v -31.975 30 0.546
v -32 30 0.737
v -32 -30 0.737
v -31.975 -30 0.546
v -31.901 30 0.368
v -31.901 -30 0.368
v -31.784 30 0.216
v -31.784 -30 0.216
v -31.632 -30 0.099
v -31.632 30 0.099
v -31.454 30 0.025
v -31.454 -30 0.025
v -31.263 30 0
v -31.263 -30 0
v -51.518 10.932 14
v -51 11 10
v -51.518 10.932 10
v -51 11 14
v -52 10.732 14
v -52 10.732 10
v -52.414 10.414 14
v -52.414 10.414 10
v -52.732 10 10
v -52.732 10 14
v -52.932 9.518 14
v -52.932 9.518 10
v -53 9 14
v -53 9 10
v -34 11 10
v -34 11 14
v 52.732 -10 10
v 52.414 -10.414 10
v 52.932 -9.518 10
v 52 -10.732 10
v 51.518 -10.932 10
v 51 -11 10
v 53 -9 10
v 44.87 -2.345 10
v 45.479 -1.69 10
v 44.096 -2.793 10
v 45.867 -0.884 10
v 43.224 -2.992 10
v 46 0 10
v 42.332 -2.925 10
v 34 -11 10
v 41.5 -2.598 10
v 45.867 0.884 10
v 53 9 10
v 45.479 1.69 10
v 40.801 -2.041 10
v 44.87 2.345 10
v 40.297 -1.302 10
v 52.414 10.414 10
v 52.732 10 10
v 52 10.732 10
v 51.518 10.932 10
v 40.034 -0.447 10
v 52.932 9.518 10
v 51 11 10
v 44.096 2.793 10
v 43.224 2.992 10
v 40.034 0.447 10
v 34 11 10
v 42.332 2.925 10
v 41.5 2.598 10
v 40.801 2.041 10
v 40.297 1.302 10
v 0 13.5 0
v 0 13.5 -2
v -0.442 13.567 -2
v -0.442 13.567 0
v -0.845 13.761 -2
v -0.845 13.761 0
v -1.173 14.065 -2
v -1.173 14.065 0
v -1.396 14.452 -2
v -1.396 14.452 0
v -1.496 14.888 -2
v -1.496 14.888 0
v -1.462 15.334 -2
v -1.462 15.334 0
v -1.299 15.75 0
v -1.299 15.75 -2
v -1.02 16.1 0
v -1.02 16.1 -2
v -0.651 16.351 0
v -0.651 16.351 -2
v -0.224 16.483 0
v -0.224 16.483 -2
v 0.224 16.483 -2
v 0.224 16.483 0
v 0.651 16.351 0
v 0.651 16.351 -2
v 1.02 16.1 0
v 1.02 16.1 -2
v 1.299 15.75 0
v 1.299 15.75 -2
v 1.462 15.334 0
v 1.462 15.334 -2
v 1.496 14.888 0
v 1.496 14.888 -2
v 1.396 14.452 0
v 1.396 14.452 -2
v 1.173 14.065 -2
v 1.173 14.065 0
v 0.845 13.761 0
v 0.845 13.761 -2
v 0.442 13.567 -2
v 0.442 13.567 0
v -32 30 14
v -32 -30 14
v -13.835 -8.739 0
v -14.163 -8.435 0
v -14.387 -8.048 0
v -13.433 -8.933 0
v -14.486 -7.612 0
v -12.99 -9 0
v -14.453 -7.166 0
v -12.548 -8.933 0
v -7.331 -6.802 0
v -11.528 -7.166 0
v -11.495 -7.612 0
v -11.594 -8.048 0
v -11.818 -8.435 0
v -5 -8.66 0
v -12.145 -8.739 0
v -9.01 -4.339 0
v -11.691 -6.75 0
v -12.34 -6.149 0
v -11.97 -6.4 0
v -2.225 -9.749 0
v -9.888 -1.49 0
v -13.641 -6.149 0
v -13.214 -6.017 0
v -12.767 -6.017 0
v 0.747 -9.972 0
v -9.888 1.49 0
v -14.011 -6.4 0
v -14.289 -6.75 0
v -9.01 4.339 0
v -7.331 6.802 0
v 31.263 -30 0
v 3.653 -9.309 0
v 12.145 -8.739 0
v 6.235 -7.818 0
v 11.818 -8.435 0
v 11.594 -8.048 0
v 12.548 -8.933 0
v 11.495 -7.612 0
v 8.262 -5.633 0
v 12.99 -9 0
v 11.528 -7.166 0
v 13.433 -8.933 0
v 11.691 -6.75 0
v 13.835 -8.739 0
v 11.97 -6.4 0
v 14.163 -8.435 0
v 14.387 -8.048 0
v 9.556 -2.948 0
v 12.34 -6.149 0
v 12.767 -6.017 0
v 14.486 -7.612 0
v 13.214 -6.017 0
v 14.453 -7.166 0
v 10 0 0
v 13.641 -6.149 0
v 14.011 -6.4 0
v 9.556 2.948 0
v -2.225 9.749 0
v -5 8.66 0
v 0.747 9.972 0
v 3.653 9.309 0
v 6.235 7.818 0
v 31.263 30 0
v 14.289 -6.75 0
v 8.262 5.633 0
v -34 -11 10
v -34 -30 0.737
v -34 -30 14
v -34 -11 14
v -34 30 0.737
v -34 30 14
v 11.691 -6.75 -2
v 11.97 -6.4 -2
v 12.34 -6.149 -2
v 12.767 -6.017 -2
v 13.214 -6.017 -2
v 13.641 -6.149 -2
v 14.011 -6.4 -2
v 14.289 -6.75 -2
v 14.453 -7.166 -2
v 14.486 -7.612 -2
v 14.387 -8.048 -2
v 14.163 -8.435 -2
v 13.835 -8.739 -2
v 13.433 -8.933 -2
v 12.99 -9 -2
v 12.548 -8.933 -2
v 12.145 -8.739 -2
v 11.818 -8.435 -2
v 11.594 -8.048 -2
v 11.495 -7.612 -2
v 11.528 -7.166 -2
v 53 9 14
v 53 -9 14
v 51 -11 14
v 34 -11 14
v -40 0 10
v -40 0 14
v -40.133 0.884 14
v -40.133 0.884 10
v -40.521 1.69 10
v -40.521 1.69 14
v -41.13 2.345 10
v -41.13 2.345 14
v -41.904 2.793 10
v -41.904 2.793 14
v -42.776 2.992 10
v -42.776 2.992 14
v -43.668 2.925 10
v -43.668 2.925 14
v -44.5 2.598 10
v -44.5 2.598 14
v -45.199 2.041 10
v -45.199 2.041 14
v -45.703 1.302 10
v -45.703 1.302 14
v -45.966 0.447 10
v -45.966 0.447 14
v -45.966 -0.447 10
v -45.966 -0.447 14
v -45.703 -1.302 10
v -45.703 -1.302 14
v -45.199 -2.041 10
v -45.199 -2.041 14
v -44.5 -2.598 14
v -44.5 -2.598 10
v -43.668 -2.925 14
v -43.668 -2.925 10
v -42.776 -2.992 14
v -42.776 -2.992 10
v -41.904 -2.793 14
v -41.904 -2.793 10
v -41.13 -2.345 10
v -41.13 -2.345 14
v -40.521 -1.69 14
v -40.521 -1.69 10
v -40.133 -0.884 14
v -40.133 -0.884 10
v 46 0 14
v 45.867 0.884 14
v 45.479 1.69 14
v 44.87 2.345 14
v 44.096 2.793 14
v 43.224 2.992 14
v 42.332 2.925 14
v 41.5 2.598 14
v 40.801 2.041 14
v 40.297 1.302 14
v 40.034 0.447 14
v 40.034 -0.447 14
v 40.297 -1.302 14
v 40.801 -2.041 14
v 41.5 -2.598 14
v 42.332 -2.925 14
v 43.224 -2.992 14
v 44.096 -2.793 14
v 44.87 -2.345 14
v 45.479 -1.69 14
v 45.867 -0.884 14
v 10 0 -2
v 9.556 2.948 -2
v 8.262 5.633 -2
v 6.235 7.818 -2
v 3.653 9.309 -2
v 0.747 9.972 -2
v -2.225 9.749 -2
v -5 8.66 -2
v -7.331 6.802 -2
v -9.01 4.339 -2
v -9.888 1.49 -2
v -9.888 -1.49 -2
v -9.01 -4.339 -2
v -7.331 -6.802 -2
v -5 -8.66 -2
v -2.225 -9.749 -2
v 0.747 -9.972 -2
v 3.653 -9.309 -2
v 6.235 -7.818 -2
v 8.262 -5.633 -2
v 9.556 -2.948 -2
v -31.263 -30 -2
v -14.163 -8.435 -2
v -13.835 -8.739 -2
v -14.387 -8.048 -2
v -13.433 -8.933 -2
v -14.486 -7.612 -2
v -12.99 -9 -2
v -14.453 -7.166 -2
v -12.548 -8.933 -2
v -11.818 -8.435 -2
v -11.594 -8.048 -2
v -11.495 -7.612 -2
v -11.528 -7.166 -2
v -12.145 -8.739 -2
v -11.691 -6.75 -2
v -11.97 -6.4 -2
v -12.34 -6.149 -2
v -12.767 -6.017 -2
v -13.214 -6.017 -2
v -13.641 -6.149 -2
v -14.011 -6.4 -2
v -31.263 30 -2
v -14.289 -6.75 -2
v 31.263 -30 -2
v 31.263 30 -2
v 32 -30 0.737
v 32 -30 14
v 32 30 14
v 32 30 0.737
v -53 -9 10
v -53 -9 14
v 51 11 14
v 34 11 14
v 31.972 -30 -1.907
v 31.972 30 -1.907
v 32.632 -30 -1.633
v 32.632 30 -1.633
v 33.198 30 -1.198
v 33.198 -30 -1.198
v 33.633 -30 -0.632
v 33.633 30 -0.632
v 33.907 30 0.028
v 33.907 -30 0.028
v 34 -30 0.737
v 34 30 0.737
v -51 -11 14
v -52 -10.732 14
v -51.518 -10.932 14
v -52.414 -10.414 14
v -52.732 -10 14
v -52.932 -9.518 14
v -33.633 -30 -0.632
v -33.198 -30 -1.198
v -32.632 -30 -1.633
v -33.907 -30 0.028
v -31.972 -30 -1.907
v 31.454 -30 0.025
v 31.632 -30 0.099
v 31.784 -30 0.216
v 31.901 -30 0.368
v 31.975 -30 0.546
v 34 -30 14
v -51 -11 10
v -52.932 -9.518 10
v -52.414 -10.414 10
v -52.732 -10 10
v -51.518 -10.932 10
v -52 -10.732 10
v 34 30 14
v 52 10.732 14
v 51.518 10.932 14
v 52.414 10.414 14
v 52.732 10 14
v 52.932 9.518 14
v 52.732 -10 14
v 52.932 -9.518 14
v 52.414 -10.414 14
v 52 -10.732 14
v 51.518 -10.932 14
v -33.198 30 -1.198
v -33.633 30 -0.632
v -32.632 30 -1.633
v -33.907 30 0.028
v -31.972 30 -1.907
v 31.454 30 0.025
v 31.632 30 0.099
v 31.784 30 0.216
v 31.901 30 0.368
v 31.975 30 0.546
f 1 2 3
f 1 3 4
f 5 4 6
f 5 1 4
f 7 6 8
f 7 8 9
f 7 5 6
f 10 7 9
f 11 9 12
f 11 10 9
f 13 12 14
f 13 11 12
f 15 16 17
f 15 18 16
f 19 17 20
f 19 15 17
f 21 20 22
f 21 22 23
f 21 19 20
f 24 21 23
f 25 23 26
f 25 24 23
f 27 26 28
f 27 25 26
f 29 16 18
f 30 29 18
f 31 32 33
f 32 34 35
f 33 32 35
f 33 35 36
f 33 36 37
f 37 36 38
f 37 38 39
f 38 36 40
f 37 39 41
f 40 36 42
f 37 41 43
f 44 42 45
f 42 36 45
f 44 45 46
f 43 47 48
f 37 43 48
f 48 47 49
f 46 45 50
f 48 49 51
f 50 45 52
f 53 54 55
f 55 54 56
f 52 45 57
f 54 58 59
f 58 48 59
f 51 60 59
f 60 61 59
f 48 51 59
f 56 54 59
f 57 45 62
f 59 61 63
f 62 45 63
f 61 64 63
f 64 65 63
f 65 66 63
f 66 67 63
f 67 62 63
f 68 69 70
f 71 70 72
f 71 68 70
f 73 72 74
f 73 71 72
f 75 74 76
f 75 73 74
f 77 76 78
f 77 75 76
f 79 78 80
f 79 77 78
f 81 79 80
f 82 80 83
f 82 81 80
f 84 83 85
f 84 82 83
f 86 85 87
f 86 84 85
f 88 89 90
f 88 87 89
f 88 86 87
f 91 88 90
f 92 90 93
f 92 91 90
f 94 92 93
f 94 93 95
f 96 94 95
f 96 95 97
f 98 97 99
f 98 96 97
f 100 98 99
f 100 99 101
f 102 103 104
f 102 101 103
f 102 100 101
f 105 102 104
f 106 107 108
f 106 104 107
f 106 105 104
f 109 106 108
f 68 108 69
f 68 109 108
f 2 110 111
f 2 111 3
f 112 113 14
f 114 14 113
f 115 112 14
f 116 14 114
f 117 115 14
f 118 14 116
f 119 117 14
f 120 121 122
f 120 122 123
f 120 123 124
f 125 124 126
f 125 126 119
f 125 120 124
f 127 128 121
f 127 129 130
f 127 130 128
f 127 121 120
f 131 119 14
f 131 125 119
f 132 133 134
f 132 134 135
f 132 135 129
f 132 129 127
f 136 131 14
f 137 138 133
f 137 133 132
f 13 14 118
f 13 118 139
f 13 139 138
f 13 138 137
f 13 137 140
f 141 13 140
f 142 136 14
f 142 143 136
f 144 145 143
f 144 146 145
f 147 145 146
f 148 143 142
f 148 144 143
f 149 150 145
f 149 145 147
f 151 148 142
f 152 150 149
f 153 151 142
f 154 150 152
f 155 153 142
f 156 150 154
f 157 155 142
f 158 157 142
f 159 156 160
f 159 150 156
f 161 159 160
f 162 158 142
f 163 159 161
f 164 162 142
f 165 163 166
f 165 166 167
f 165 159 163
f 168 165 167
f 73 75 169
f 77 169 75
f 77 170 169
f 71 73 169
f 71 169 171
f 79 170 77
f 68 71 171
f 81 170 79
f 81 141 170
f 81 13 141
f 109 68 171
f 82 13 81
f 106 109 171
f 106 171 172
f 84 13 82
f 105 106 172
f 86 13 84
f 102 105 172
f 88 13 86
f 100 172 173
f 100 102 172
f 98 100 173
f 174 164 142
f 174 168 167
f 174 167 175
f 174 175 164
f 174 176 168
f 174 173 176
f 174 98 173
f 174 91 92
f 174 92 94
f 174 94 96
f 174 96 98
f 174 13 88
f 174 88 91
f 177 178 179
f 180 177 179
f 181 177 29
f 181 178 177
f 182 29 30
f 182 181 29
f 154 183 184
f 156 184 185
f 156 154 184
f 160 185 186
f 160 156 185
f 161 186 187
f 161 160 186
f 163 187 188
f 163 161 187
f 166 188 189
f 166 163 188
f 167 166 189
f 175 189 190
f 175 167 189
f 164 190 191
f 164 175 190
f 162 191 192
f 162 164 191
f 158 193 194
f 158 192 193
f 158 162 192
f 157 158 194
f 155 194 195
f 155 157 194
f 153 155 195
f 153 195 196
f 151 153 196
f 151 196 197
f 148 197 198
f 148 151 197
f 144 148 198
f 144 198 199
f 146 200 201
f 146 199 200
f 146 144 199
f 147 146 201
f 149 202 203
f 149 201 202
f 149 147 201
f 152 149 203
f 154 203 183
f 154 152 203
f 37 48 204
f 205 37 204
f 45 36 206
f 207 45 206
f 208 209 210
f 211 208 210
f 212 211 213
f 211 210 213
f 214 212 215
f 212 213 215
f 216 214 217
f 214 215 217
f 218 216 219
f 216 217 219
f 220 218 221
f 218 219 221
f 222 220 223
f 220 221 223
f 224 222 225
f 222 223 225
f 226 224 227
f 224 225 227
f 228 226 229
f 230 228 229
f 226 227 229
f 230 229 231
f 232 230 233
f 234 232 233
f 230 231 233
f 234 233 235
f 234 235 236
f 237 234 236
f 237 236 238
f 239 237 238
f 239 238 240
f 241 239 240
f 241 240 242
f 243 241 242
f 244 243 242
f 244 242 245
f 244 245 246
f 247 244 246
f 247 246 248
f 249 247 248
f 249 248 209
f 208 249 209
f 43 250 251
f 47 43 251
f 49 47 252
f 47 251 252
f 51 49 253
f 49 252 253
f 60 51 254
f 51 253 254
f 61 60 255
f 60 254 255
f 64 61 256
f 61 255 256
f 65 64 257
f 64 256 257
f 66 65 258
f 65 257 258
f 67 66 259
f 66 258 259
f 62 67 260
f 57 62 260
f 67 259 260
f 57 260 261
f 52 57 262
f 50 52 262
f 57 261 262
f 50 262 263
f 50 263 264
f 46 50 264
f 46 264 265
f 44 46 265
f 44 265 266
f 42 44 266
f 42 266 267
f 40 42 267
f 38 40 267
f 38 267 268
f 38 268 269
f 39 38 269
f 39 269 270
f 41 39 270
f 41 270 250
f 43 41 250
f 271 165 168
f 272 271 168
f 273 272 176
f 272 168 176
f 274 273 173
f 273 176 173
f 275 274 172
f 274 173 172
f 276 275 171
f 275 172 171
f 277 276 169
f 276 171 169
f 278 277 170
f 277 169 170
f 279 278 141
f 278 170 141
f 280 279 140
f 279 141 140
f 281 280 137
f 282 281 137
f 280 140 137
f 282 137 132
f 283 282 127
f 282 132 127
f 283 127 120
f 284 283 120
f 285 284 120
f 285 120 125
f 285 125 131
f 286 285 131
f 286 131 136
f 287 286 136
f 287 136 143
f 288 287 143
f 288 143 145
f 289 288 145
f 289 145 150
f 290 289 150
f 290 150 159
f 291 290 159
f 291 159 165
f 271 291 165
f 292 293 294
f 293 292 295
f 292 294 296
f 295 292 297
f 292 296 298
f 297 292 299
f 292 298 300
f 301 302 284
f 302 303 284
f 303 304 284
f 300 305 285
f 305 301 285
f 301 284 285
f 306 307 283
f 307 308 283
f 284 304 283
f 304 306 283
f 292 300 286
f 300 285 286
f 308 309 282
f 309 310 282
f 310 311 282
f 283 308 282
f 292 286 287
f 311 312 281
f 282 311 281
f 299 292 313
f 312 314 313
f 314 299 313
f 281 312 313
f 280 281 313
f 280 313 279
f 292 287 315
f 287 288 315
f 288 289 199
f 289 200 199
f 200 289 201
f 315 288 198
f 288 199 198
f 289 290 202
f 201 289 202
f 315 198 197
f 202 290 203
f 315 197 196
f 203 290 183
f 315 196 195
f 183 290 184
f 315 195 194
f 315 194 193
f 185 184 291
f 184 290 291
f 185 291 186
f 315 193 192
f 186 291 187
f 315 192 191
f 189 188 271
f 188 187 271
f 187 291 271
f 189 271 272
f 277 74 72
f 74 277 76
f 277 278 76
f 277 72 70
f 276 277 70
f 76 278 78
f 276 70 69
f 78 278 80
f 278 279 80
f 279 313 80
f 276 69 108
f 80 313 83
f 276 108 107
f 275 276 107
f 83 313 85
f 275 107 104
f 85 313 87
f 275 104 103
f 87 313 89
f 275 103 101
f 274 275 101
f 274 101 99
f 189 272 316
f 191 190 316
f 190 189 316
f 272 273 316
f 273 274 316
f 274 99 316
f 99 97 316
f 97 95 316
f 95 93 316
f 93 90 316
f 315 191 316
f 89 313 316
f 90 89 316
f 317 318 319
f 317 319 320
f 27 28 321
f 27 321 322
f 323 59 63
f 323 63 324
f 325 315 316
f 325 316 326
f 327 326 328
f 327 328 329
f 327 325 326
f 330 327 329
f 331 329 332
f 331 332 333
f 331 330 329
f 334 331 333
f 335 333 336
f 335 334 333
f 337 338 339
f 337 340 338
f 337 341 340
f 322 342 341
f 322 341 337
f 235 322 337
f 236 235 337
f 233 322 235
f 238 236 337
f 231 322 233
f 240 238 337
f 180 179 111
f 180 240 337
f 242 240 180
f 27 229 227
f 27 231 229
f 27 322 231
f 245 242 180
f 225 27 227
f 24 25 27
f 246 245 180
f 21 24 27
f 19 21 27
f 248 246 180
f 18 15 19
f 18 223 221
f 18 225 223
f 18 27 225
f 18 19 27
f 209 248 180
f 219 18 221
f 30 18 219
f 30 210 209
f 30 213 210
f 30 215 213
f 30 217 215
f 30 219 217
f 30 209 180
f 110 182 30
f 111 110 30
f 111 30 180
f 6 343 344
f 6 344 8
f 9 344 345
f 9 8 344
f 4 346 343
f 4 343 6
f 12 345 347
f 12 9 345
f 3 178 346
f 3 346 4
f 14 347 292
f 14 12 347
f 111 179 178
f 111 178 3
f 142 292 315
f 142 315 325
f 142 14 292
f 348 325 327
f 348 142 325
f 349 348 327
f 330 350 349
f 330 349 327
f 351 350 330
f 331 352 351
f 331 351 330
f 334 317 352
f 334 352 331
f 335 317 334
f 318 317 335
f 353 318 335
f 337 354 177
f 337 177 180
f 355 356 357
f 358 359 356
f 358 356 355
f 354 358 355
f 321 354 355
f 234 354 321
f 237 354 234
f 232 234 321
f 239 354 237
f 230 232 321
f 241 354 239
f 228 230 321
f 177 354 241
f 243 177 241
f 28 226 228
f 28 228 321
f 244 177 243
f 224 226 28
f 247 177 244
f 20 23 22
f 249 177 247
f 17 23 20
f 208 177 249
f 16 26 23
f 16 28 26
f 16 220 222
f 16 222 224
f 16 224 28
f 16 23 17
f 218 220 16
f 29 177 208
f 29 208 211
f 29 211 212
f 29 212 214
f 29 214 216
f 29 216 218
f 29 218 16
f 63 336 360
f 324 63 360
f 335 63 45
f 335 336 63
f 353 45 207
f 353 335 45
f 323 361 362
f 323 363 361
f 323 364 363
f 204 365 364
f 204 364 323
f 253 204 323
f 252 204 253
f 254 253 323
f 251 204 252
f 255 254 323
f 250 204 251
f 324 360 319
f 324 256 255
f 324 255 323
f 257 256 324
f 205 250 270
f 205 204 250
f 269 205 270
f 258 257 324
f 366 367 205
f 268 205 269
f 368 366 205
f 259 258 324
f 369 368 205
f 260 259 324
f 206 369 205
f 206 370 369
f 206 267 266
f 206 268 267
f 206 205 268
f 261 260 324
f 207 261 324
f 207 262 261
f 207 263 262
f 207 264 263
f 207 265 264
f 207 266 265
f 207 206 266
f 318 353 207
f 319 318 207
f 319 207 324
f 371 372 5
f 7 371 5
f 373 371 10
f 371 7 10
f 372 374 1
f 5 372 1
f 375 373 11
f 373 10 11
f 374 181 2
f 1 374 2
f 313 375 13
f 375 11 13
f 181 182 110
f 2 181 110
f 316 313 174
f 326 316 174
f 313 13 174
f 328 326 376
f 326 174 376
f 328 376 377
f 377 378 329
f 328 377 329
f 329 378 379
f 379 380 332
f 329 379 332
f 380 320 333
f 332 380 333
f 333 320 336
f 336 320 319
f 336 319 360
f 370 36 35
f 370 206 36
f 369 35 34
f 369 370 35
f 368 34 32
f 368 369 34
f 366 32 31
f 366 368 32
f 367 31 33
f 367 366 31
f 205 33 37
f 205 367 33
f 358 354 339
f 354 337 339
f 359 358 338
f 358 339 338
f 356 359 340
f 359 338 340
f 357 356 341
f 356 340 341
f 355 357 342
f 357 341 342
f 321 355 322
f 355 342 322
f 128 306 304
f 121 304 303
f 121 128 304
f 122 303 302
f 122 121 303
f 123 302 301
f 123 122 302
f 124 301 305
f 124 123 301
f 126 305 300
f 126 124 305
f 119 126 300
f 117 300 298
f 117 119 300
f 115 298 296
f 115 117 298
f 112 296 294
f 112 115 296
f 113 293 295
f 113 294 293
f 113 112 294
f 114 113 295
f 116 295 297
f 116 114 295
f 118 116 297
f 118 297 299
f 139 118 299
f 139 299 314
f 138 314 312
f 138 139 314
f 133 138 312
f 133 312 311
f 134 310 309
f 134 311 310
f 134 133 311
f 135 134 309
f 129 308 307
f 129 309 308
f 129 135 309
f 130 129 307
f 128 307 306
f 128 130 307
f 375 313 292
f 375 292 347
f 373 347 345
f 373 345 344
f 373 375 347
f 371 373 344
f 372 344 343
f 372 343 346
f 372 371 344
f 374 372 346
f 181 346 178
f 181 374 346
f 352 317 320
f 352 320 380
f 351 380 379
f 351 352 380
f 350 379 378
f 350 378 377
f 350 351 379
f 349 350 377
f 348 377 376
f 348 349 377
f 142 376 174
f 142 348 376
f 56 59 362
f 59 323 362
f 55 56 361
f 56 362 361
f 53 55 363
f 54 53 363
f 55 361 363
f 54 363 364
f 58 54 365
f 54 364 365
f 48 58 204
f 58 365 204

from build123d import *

# Parameters (mm, degrees)
SKETCH1_W                      = 64
SKETCH1_H                      = 60
BASE_FLANGE1_DEPTH             = 2
EDGE_FLANGE1_STRIP_W           = 9.4732
EDGE_FLANGE1_STRIP_H           = 2
EDGE_FLANGE1_STRIP_CUT_DEPTH   = 60
EDGE_FLANGE1_STRIP_2_W         = 9.4732
EDGE_FLANGE1_STRIP_2_H         = 2
EDGE_FLANGE1_STRIP_CUT_2_DEPTH = 60
EDGE_FLANGE1_DEPTH             = 60
EDGE_FLANGE1_BEND_DEPTH        = 60
SKETCH12_W                     = 4
SKETCH12_H                     = 22
BOSS_EXTRUDE1_DEPTH            = 19
FILLET1_R                      = 2
FILLET1_OF_MIRROR1_R           = 2
F_6_0MM_DOWEL_HOLE1_D          = 6
F_6_0MM_DOWEL_HOLE1_DEPTH      = 12
F_6_0MM_DOWEL_HOLE1_TIP        = 1.802581857
CUT_EXTRUDE1_REACH             = 64.49
SKETCH19_R                     = 10
CIRPATTERN1_COUNT              = 3


# Sheet-metal steps are written as plain solids
with BuildPart() as part:
    # Sketch1 → Base-Flange1 (new body)
    with BuildSketch(Plane.XY):
        Rectangle(SKETCH1_W, SKETCH1_H)
    extrude(amount=-BASE_FLANGE1_DEPTH)

    # Edge-Flange1 strip (across the edge) → Edge-Flange1 strip cut (cut)
    with BuildSketch(Plane(origin=(-32, 30, 0), x_dir=(1, 0, 0), z_dir=(0, -1, 0))):
        with Locations((-4, -1)):
            Rectangle(EDGE_FLANGE1_STRIP_W, EDGE_FLANGE1_STRIP_H)
    extrude(amount=EDGE_FLANGE1_STRIP_CUT_DEPTH, mode=Mode.SUBTRACT)

    # Edge-Flange1 strip 2 (across the edge) → Edge-Flange1 strip cut 2 (cut)
    with BuildSketch(Plane(origin=(32, -30, 0), x_dir=(-1, 0, 0), z_dir=(0, 1, 0))):
        with Locations((-4, -1)):
            Rectangle(EDGE_FLANGE1_STRIP_2_W, EDGE_FLANGE1_STRIP_2_H)
    extrude(amount=EDGE_FLANGE1_STRIP_CUT_2_DEPTH, mode=Mode.SUBTRACT)

    # Edge-Flange1 section (across the edge) → Edge-Flange1 (add)
    with BuildSketch(Plane(origin=(-32, 30, 0), x_dir=(1, 0, 0), z_dir=(0, -1, 0))):
        with BuildLine():
            Line((-2, 0.7366), (-2, 14))
            Line((-2, 14), (0, 14))
            Line((0, 14), (0, 0.7366))
            ThreePointArc((0, 0.7366), (0.215745145, 0.215745145), (0.7366, 0))
            Line((0.7366, 0), (0.7366, -2))
            ThreePointArc((0.7366, -2), (-1.198468417, -1.198468417), (-2, 0.7366))
        make_face()
    extrude(amount=EDGE_FLANGE1_DEPTH)

    # Edge-Flange1 section 2 (across the edge) → Edge-Flange1 bend (add)
    with BuildSketch(Plane(origin=(32, -30, 0), x_dir=(-1, 0, 0), z_dir=(0, 1, 0))):
        with BuildLine():
            Line((-2, 0.7366), (-2, 14))
            Line((-2, 14), (0, 14))
            Line((0, 14), (0, 0.7366))
            ThreePointArc((0, 0.7366), (0.215745145, 0.215745145), (0.7366, 0))
            Line((0.7366, 0), (0.7366, -2))
            ThreePointArc((0.7366, -2), (-1.198468417, -1.198468417), (-2, 0.7366))
        make_face()
    extrude(amount=EDGE_FLANGE1_BEND_DEPTH)

    # Sketch12 → Boss-Extrude1 (add)
    with BuildSketch(Plane.ZY.offset(34)):
        with Locations((12, 0)):
            Rectangle(SKETCH12_W, SKETCH12_H)
    boss_extrude1 = extrude(amount=BOSS_EXTRUDE1_DEPTH)

    # Fillet1
    fillet1_edges = [part.edges().sort_by_distance(p)[0] for p in [
        (-53, 11, 12),
        (-53, -11, 12),
    ]]
    fillet(fillet1_edges, radius=FILLET1_R)

    # Mirror1: Boss-Extrude1 across plane
    add(boss_extrude1.mirror(Plane(origin=(0, 0, 0), x_dir=(0, 0, 1), z_dir=(1, 0, 0))))

    # Fillet1 of Mirror1
    fillet1_of_mirror1_edges = [part.edges().sort_by_distance(p)[0] for p in [
        (53, 11, 12),
        (53, -11, 12),
    ]]
    fillet(fillet1_of_mirror1_edges, radius=FILLET1_OF_MIRROR1_R)

    # Ø6.0mm Dowel Hole1
    with Locations(Plane(origin=(0, 0, 10), x_dir=(-1, 0, 0), z_dir=(0, 0, -1))):
        with Locations((-43, 0), (43, 0)):
            Hole(F_6_0MM_DOWEL_HOLE1_D / 2, depth=F_6_0MM_DOWEL_HOLE1_DEPTH)
            with Locations((0, 0, -(F_6_0MM_DOWEL_HOLE1_DEPTH + F_6_0MM_DOWEL_HOLE1_TIP / 2))):  # 118° drill point
                Cone(0, F_6_0MM_DOWEL_HOLE1_D / 2, F_6_0MM_DOWEL_HOLE1_TIP, mode=Mode.SUBTRACT)

    # Sketch19 → Cut-Extrude1 (cut, up to next)
    with BuildSketch(Plane.XY, mode=Mode.PRIVATE) as cut_extrude1_sk1:
        Circle(SKETCH19_R)
    cut_extrude1_tool1 = extrude(cut_extrude1_sk1.sketch, amount=-CUT_EXTRUDE1_REACH, mode=Mode.PRIVATE) & part.part
    add(cut_extrude1_tool1.solids().sort_by_distance((0, 0, 0))[0], mode=Mode.SUBTRACT)

    # Sketch20 → Ø3.0mm Dowel Hole1 (revolve, cut)
    with BuildSketch(Plane(origin=(0, 15, 0), x_dir=(0, -1, 0), z_dir=(1, 0, 0))):
        Polygon((0, 0), (0, 12.901290929), (1.5, 12), (1.5, 0), align=None)
    f_3_0mm_dowel_hole1 = revolve(axis=Axis((0, 15, 6.35), (0, 0, -1)), mode=Mode.SUBTRACT)

    # CirPattern1: Ø3.0mm Dowel Hole1 ×3 about axis
    cirpattern1_axis = Axis((0, 0, 0), (0, 0, 1))
    for i in range(1, CIRPATTERN1_COUNT):
        add(f_3_0mm_dowel_hole1.rotate(cirpattern1_axis, i * 360 / CIRPATTERN1_COUNT), mode=Mode.SUBTRACT)


solid = part.part
